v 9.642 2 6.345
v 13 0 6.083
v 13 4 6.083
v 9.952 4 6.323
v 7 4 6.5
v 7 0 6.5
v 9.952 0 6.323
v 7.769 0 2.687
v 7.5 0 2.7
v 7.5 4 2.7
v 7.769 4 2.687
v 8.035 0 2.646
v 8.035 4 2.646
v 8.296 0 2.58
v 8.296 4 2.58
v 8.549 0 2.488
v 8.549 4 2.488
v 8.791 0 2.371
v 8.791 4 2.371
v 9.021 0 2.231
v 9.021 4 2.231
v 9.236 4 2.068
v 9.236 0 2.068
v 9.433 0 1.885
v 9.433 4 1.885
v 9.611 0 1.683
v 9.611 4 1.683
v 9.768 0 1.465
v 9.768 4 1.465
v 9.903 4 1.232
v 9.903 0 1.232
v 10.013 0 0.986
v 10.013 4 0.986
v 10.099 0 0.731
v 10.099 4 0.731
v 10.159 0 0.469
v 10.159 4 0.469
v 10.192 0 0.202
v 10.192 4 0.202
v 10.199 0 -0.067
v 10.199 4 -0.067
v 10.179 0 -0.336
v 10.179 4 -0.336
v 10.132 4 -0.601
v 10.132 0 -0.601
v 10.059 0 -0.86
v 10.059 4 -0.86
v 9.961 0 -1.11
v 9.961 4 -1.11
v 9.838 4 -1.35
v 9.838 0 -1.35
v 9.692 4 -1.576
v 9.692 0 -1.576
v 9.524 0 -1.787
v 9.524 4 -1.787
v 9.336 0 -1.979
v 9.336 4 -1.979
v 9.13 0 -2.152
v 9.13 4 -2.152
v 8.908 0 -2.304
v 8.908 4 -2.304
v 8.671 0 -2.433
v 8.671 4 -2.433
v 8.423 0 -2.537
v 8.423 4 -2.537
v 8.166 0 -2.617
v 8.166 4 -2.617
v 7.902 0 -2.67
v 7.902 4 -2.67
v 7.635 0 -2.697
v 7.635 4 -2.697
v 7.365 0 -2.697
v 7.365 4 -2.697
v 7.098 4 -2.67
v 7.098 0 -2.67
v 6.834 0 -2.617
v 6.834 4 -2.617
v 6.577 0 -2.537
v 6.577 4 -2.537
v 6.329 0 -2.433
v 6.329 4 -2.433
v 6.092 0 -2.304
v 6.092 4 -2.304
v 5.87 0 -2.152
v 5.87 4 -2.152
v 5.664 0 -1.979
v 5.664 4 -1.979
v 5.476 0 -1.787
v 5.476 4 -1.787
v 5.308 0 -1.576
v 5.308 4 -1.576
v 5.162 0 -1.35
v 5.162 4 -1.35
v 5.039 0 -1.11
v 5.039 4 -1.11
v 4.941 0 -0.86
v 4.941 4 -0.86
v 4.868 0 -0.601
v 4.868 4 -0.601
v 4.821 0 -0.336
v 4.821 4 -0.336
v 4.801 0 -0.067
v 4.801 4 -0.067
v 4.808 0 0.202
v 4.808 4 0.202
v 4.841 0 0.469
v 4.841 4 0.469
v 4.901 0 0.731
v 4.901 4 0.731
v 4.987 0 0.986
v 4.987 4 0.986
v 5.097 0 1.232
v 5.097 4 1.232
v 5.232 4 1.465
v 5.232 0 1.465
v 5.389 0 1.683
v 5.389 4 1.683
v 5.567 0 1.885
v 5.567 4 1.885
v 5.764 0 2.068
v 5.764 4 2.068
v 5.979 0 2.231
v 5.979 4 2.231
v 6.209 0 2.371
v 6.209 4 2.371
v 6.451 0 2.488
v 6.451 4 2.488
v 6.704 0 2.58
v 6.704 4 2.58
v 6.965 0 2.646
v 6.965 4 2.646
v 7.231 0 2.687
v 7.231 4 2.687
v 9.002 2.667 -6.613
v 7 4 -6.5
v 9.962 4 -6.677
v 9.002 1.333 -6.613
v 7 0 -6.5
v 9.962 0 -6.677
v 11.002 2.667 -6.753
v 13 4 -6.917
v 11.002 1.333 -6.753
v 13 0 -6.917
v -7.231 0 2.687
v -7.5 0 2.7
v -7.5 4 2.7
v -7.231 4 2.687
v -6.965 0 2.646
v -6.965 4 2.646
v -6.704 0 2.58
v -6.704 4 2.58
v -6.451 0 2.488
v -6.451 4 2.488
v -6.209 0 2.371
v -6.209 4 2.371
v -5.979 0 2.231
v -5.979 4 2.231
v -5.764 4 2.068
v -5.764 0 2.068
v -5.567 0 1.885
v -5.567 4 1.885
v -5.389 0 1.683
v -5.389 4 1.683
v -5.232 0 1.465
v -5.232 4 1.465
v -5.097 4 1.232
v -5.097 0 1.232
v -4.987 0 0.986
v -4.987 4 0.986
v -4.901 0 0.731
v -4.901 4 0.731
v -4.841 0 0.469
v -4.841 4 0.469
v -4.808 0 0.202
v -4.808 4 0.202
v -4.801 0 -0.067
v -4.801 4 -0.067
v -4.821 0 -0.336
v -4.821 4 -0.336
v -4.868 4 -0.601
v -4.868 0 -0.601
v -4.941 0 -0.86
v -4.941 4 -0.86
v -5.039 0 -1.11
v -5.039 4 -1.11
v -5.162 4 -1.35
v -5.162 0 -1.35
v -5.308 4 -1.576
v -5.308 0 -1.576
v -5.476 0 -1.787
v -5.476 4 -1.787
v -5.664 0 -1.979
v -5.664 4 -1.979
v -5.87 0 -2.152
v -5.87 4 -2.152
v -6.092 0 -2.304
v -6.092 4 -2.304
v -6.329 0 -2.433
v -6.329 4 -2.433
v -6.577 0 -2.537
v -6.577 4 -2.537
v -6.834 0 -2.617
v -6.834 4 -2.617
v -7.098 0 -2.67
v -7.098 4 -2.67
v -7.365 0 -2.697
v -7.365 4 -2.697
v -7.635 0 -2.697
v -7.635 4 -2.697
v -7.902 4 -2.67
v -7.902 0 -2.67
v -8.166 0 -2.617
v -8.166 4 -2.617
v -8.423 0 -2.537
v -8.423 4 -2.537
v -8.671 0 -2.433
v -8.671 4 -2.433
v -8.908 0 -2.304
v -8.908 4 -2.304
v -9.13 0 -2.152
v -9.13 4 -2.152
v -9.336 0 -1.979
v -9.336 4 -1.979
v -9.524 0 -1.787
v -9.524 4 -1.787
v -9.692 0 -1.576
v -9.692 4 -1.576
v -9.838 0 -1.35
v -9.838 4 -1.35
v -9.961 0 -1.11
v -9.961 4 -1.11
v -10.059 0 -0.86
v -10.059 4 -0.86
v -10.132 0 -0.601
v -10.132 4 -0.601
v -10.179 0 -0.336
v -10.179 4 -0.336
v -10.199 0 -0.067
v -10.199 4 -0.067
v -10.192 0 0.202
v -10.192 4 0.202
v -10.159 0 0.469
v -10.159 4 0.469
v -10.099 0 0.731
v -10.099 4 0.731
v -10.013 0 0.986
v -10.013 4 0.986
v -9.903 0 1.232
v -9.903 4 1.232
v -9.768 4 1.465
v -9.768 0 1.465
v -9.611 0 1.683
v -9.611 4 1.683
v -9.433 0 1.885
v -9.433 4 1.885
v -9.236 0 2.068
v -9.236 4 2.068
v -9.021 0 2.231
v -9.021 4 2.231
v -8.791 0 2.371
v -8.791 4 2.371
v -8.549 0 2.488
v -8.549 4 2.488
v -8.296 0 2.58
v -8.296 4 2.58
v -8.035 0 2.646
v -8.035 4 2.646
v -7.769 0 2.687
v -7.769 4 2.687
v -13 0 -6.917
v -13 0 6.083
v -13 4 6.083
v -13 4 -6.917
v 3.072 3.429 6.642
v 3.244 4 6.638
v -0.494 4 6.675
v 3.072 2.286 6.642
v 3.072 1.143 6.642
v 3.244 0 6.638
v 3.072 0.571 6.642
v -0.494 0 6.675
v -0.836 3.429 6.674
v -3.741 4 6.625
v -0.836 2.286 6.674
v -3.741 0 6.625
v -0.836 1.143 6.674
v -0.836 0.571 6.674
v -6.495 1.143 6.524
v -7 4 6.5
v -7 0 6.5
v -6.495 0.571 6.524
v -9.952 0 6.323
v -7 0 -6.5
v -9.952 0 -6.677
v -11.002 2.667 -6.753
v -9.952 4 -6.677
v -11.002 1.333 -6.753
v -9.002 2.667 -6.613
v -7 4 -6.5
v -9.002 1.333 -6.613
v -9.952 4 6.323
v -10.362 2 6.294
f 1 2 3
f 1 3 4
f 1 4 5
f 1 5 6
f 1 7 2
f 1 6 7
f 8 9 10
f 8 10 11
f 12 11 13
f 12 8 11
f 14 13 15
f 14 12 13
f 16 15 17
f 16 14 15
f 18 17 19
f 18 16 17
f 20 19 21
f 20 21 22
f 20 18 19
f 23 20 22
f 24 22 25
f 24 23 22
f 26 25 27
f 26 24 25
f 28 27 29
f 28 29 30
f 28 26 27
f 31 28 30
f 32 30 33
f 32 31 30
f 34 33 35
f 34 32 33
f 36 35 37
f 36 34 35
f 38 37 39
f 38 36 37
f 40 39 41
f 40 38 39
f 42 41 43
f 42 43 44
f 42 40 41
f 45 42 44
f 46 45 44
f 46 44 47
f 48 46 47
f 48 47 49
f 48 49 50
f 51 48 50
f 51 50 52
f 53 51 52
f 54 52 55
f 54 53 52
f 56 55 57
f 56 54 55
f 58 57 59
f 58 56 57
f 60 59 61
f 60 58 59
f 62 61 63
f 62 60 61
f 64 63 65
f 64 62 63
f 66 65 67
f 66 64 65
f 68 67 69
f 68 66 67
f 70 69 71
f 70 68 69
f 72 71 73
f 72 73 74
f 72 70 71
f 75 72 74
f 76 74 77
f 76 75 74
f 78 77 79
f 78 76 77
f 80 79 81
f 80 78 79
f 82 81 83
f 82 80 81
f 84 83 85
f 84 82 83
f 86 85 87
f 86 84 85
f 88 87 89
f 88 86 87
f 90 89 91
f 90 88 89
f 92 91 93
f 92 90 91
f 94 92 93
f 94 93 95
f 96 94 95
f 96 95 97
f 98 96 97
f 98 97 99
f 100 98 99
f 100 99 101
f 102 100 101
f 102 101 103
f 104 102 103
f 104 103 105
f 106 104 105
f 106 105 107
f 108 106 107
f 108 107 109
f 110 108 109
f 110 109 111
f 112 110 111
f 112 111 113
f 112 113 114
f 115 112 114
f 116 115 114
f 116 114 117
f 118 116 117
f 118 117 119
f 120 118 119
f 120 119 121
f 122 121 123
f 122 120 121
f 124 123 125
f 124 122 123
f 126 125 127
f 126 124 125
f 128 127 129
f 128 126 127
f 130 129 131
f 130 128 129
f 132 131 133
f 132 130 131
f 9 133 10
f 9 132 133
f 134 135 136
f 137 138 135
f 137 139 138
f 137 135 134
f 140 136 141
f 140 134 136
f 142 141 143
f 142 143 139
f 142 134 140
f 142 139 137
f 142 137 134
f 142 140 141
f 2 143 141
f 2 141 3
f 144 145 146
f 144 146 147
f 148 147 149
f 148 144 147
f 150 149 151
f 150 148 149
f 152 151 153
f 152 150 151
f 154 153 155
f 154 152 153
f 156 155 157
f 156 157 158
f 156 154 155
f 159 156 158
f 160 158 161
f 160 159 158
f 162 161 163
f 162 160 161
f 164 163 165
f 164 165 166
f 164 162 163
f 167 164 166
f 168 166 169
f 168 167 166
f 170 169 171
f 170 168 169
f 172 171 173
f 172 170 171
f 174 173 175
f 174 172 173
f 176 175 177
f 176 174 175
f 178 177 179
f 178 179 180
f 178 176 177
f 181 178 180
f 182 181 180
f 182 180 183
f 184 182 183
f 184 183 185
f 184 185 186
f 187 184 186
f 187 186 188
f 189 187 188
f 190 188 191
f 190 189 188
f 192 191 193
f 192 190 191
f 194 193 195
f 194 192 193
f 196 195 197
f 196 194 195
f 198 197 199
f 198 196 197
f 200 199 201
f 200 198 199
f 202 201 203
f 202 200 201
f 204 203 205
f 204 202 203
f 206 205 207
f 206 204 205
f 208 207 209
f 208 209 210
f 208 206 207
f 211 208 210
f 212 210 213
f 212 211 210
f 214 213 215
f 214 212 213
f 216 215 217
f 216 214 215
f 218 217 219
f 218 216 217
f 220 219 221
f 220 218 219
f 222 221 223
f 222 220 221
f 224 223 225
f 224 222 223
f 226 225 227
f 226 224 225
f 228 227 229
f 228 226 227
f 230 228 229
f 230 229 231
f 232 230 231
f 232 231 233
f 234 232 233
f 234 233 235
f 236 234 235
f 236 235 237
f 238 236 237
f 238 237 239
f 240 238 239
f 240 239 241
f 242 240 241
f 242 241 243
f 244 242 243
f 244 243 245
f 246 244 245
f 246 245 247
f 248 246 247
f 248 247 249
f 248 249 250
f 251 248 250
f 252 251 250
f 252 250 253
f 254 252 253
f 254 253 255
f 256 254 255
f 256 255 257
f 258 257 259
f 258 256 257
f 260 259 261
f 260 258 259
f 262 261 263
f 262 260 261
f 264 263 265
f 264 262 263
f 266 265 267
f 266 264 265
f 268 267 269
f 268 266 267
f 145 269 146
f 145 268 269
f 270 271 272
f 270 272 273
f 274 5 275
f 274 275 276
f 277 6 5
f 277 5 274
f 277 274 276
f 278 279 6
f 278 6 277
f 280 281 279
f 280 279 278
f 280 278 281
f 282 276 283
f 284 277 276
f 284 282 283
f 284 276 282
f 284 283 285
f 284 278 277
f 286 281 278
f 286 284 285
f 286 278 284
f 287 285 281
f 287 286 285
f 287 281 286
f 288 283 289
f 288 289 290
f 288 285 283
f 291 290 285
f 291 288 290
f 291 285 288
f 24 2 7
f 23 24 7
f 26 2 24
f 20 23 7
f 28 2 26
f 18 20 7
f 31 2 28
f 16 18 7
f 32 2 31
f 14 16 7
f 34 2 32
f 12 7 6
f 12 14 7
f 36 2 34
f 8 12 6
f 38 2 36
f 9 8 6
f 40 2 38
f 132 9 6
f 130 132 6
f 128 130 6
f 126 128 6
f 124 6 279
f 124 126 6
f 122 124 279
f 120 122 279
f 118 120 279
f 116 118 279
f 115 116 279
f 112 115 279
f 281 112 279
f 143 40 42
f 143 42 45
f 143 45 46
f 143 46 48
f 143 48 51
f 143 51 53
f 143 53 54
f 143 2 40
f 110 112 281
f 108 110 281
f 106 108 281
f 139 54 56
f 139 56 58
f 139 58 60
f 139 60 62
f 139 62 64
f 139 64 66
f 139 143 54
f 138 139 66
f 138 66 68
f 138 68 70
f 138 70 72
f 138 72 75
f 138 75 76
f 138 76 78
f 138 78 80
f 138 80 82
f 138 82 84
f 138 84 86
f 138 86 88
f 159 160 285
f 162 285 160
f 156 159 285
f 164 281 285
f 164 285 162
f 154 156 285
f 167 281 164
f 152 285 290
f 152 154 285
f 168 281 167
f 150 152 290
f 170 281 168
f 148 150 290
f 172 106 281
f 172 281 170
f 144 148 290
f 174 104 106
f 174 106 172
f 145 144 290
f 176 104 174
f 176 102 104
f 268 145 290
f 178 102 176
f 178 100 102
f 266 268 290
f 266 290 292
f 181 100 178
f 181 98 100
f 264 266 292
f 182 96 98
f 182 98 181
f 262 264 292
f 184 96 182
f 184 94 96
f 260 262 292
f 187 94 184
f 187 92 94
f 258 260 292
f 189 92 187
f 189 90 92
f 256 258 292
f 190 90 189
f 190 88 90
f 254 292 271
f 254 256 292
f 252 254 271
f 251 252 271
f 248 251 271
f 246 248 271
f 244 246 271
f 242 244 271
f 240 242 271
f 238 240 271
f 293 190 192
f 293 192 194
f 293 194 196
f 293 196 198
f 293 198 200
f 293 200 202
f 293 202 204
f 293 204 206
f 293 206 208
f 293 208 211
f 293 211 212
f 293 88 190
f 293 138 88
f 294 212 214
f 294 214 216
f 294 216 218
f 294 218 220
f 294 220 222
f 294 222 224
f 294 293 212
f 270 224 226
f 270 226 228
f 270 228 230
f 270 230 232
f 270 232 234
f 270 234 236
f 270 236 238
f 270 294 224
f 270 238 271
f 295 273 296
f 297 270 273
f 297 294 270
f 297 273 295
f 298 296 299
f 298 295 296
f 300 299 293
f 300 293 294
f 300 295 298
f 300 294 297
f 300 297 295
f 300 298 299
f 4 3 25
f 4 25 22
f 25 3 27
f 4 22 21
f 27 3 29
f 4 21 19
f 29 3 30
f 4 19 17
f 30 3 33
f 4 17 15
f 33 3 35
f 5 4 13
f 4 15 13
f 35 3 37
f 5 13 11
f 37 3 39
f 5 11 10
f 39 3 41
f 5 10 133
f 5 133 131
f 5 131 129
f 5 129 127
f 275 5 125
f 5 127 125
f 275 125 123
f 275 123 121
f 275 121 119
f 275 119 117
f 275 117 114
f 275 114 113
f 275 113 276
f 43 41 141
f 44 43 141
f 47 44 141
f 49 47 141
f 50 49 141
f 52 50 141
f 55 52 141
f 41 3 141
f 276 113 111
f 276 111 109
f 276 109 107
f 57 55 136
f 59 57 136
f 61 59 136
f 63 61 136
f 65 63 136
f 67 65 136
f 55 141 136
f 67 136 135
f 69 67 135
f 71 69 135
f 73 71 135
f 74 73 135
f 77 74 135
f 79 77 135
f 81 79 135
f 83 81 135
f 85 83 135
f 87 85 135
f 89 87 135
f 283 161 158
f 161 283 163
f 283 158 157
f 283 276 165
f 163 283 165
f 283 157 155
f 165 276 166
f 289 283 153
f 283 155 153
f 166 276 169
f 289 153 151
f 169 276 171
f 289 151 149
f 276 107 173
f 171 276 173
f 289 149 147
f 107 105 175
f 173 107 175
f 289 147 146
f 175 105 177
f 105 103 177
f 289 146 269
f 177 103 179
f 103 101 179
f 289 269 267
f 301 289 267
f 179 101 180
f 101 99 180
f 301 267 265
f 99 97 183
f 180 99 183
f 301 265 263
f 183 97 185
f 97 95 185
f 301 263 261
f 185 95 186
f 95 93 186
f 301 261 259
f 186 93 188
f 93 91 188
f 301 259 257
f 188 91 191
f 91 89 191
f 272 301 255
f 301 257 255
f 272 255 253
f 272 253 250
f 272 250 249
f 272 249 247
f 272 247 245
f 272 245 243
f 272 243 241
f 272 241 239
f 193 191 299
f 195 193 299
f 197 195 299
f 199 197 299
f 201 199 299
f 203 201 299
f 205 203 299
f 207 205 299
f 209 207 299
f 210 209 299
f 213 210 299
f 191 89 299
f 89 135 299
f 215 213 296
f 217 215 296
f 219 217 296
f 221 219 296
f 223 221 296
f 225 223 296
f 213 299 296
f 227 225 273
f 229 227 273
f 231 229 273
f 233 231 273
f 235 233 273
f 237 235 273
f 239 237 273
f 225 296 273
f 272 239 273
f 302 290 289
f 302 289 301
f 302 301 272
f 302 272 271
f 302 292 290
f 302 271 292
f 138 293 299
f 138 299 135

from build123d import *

# Parameters (mm, degrees)
SKETCH1_R           = 2.7
BOSS_EXTRUDE1_DEPTH = 4


with BuildPart() as part:
    # Sketch1 → Boss-Extrude1 (new body)
    with BuildSketch(Plane(origin=(0, 0, 0), x_dir=(1, 0, 0), z_dir=(0, 1, 0))):
        with BuildLine():
            Line((13, 6.916598833), (13, -6.083401167))
            add(Edge.make_bspline(
                [(13, -6.083401167), (11.881455284, -6.181548449), (9.882372116, -6.337878454), (7.880965391, -6.456052029), (7, -6.5)],
                knots=[0, 0, 0, 0, 0.56, 1, 1, 1, 1], degree=3))
            add(Edge.make_bspline(
                [(7, -6.5), (6.834819068, -6.508242741), (6.666566964, -6.516342005), (5.350428343, -6.577459909), (3.178772662, -6.652062078), (1.020954011, -6.676072233), (-0.278468619, -6.676071849), (-1.578970751, -6.672116146), (-3.740363082, -6.635008847), (-5.632474881, -6.564362453), (-6.66657307, -6.516341675), (-6.834821325, -6.50824259), (-6.999999228, -6.5)],
                knots=[0, 0, 0, 0, 0.036447922, 0.036447922, 0.28, 0.500000307, 0.500000307, 0.56, 0.78, 0.963552693, 0.963552693, 1, 1, 1, 1], degree=3))
            add(Edge.make_bspline(
                [(-6.999999228, -6.5), (-8.121293995, -6.444062922), (-10.122381008, -6.320906395), (-12.121162985, -6.160515106), (-12.999999228, -6.083401167)],
                knots=[0, 0, 0, 0, 0.56, 1, 1, 1, 1], degree=3))
            Line((-12.999999228, -6.083401167), (-12.999999614, 6.916598833))
            add(Edge.make_bspline(
                [(-12.999999614, 6.916598833), (-11.002598721, 6.741335829), (-9.00219407, 6.599881753), (-7, 6.5)],
                knots=[1.5e-08, 1.5e-08, 1.5e-08, 1.5e-08, 0.230998109, 0.230998109, 0.230998109, 0.230998109], degree=3))
            Line((-7, 6.5), (7, 6.5))
            add(Edge.make_bspline(
                [(7, 6.5), (9.00219407, 6.599881753), (11.002598721, 6.741335829), (13, 6.916598833)],
                knots=[0.769001891, 0.769001891, 0.769001891, 0.769001891, 1, 1, 1, 1], degree=3))
        make_face()
        with Locations(Location((-7.5, 0, 0), (0, 0, 270))):
            Circle(SKETCH1_R, mode=Mode.SUBTRACT)
        with Locations(Location((7.5, 0, 0), (0, 0, 270))):
            Circle(SKETCH1_R, mode=Mode.SUBTRACT)
    extrude(amount=BOSS_EXTRUDE1_DEPTH)


solid = part.part
